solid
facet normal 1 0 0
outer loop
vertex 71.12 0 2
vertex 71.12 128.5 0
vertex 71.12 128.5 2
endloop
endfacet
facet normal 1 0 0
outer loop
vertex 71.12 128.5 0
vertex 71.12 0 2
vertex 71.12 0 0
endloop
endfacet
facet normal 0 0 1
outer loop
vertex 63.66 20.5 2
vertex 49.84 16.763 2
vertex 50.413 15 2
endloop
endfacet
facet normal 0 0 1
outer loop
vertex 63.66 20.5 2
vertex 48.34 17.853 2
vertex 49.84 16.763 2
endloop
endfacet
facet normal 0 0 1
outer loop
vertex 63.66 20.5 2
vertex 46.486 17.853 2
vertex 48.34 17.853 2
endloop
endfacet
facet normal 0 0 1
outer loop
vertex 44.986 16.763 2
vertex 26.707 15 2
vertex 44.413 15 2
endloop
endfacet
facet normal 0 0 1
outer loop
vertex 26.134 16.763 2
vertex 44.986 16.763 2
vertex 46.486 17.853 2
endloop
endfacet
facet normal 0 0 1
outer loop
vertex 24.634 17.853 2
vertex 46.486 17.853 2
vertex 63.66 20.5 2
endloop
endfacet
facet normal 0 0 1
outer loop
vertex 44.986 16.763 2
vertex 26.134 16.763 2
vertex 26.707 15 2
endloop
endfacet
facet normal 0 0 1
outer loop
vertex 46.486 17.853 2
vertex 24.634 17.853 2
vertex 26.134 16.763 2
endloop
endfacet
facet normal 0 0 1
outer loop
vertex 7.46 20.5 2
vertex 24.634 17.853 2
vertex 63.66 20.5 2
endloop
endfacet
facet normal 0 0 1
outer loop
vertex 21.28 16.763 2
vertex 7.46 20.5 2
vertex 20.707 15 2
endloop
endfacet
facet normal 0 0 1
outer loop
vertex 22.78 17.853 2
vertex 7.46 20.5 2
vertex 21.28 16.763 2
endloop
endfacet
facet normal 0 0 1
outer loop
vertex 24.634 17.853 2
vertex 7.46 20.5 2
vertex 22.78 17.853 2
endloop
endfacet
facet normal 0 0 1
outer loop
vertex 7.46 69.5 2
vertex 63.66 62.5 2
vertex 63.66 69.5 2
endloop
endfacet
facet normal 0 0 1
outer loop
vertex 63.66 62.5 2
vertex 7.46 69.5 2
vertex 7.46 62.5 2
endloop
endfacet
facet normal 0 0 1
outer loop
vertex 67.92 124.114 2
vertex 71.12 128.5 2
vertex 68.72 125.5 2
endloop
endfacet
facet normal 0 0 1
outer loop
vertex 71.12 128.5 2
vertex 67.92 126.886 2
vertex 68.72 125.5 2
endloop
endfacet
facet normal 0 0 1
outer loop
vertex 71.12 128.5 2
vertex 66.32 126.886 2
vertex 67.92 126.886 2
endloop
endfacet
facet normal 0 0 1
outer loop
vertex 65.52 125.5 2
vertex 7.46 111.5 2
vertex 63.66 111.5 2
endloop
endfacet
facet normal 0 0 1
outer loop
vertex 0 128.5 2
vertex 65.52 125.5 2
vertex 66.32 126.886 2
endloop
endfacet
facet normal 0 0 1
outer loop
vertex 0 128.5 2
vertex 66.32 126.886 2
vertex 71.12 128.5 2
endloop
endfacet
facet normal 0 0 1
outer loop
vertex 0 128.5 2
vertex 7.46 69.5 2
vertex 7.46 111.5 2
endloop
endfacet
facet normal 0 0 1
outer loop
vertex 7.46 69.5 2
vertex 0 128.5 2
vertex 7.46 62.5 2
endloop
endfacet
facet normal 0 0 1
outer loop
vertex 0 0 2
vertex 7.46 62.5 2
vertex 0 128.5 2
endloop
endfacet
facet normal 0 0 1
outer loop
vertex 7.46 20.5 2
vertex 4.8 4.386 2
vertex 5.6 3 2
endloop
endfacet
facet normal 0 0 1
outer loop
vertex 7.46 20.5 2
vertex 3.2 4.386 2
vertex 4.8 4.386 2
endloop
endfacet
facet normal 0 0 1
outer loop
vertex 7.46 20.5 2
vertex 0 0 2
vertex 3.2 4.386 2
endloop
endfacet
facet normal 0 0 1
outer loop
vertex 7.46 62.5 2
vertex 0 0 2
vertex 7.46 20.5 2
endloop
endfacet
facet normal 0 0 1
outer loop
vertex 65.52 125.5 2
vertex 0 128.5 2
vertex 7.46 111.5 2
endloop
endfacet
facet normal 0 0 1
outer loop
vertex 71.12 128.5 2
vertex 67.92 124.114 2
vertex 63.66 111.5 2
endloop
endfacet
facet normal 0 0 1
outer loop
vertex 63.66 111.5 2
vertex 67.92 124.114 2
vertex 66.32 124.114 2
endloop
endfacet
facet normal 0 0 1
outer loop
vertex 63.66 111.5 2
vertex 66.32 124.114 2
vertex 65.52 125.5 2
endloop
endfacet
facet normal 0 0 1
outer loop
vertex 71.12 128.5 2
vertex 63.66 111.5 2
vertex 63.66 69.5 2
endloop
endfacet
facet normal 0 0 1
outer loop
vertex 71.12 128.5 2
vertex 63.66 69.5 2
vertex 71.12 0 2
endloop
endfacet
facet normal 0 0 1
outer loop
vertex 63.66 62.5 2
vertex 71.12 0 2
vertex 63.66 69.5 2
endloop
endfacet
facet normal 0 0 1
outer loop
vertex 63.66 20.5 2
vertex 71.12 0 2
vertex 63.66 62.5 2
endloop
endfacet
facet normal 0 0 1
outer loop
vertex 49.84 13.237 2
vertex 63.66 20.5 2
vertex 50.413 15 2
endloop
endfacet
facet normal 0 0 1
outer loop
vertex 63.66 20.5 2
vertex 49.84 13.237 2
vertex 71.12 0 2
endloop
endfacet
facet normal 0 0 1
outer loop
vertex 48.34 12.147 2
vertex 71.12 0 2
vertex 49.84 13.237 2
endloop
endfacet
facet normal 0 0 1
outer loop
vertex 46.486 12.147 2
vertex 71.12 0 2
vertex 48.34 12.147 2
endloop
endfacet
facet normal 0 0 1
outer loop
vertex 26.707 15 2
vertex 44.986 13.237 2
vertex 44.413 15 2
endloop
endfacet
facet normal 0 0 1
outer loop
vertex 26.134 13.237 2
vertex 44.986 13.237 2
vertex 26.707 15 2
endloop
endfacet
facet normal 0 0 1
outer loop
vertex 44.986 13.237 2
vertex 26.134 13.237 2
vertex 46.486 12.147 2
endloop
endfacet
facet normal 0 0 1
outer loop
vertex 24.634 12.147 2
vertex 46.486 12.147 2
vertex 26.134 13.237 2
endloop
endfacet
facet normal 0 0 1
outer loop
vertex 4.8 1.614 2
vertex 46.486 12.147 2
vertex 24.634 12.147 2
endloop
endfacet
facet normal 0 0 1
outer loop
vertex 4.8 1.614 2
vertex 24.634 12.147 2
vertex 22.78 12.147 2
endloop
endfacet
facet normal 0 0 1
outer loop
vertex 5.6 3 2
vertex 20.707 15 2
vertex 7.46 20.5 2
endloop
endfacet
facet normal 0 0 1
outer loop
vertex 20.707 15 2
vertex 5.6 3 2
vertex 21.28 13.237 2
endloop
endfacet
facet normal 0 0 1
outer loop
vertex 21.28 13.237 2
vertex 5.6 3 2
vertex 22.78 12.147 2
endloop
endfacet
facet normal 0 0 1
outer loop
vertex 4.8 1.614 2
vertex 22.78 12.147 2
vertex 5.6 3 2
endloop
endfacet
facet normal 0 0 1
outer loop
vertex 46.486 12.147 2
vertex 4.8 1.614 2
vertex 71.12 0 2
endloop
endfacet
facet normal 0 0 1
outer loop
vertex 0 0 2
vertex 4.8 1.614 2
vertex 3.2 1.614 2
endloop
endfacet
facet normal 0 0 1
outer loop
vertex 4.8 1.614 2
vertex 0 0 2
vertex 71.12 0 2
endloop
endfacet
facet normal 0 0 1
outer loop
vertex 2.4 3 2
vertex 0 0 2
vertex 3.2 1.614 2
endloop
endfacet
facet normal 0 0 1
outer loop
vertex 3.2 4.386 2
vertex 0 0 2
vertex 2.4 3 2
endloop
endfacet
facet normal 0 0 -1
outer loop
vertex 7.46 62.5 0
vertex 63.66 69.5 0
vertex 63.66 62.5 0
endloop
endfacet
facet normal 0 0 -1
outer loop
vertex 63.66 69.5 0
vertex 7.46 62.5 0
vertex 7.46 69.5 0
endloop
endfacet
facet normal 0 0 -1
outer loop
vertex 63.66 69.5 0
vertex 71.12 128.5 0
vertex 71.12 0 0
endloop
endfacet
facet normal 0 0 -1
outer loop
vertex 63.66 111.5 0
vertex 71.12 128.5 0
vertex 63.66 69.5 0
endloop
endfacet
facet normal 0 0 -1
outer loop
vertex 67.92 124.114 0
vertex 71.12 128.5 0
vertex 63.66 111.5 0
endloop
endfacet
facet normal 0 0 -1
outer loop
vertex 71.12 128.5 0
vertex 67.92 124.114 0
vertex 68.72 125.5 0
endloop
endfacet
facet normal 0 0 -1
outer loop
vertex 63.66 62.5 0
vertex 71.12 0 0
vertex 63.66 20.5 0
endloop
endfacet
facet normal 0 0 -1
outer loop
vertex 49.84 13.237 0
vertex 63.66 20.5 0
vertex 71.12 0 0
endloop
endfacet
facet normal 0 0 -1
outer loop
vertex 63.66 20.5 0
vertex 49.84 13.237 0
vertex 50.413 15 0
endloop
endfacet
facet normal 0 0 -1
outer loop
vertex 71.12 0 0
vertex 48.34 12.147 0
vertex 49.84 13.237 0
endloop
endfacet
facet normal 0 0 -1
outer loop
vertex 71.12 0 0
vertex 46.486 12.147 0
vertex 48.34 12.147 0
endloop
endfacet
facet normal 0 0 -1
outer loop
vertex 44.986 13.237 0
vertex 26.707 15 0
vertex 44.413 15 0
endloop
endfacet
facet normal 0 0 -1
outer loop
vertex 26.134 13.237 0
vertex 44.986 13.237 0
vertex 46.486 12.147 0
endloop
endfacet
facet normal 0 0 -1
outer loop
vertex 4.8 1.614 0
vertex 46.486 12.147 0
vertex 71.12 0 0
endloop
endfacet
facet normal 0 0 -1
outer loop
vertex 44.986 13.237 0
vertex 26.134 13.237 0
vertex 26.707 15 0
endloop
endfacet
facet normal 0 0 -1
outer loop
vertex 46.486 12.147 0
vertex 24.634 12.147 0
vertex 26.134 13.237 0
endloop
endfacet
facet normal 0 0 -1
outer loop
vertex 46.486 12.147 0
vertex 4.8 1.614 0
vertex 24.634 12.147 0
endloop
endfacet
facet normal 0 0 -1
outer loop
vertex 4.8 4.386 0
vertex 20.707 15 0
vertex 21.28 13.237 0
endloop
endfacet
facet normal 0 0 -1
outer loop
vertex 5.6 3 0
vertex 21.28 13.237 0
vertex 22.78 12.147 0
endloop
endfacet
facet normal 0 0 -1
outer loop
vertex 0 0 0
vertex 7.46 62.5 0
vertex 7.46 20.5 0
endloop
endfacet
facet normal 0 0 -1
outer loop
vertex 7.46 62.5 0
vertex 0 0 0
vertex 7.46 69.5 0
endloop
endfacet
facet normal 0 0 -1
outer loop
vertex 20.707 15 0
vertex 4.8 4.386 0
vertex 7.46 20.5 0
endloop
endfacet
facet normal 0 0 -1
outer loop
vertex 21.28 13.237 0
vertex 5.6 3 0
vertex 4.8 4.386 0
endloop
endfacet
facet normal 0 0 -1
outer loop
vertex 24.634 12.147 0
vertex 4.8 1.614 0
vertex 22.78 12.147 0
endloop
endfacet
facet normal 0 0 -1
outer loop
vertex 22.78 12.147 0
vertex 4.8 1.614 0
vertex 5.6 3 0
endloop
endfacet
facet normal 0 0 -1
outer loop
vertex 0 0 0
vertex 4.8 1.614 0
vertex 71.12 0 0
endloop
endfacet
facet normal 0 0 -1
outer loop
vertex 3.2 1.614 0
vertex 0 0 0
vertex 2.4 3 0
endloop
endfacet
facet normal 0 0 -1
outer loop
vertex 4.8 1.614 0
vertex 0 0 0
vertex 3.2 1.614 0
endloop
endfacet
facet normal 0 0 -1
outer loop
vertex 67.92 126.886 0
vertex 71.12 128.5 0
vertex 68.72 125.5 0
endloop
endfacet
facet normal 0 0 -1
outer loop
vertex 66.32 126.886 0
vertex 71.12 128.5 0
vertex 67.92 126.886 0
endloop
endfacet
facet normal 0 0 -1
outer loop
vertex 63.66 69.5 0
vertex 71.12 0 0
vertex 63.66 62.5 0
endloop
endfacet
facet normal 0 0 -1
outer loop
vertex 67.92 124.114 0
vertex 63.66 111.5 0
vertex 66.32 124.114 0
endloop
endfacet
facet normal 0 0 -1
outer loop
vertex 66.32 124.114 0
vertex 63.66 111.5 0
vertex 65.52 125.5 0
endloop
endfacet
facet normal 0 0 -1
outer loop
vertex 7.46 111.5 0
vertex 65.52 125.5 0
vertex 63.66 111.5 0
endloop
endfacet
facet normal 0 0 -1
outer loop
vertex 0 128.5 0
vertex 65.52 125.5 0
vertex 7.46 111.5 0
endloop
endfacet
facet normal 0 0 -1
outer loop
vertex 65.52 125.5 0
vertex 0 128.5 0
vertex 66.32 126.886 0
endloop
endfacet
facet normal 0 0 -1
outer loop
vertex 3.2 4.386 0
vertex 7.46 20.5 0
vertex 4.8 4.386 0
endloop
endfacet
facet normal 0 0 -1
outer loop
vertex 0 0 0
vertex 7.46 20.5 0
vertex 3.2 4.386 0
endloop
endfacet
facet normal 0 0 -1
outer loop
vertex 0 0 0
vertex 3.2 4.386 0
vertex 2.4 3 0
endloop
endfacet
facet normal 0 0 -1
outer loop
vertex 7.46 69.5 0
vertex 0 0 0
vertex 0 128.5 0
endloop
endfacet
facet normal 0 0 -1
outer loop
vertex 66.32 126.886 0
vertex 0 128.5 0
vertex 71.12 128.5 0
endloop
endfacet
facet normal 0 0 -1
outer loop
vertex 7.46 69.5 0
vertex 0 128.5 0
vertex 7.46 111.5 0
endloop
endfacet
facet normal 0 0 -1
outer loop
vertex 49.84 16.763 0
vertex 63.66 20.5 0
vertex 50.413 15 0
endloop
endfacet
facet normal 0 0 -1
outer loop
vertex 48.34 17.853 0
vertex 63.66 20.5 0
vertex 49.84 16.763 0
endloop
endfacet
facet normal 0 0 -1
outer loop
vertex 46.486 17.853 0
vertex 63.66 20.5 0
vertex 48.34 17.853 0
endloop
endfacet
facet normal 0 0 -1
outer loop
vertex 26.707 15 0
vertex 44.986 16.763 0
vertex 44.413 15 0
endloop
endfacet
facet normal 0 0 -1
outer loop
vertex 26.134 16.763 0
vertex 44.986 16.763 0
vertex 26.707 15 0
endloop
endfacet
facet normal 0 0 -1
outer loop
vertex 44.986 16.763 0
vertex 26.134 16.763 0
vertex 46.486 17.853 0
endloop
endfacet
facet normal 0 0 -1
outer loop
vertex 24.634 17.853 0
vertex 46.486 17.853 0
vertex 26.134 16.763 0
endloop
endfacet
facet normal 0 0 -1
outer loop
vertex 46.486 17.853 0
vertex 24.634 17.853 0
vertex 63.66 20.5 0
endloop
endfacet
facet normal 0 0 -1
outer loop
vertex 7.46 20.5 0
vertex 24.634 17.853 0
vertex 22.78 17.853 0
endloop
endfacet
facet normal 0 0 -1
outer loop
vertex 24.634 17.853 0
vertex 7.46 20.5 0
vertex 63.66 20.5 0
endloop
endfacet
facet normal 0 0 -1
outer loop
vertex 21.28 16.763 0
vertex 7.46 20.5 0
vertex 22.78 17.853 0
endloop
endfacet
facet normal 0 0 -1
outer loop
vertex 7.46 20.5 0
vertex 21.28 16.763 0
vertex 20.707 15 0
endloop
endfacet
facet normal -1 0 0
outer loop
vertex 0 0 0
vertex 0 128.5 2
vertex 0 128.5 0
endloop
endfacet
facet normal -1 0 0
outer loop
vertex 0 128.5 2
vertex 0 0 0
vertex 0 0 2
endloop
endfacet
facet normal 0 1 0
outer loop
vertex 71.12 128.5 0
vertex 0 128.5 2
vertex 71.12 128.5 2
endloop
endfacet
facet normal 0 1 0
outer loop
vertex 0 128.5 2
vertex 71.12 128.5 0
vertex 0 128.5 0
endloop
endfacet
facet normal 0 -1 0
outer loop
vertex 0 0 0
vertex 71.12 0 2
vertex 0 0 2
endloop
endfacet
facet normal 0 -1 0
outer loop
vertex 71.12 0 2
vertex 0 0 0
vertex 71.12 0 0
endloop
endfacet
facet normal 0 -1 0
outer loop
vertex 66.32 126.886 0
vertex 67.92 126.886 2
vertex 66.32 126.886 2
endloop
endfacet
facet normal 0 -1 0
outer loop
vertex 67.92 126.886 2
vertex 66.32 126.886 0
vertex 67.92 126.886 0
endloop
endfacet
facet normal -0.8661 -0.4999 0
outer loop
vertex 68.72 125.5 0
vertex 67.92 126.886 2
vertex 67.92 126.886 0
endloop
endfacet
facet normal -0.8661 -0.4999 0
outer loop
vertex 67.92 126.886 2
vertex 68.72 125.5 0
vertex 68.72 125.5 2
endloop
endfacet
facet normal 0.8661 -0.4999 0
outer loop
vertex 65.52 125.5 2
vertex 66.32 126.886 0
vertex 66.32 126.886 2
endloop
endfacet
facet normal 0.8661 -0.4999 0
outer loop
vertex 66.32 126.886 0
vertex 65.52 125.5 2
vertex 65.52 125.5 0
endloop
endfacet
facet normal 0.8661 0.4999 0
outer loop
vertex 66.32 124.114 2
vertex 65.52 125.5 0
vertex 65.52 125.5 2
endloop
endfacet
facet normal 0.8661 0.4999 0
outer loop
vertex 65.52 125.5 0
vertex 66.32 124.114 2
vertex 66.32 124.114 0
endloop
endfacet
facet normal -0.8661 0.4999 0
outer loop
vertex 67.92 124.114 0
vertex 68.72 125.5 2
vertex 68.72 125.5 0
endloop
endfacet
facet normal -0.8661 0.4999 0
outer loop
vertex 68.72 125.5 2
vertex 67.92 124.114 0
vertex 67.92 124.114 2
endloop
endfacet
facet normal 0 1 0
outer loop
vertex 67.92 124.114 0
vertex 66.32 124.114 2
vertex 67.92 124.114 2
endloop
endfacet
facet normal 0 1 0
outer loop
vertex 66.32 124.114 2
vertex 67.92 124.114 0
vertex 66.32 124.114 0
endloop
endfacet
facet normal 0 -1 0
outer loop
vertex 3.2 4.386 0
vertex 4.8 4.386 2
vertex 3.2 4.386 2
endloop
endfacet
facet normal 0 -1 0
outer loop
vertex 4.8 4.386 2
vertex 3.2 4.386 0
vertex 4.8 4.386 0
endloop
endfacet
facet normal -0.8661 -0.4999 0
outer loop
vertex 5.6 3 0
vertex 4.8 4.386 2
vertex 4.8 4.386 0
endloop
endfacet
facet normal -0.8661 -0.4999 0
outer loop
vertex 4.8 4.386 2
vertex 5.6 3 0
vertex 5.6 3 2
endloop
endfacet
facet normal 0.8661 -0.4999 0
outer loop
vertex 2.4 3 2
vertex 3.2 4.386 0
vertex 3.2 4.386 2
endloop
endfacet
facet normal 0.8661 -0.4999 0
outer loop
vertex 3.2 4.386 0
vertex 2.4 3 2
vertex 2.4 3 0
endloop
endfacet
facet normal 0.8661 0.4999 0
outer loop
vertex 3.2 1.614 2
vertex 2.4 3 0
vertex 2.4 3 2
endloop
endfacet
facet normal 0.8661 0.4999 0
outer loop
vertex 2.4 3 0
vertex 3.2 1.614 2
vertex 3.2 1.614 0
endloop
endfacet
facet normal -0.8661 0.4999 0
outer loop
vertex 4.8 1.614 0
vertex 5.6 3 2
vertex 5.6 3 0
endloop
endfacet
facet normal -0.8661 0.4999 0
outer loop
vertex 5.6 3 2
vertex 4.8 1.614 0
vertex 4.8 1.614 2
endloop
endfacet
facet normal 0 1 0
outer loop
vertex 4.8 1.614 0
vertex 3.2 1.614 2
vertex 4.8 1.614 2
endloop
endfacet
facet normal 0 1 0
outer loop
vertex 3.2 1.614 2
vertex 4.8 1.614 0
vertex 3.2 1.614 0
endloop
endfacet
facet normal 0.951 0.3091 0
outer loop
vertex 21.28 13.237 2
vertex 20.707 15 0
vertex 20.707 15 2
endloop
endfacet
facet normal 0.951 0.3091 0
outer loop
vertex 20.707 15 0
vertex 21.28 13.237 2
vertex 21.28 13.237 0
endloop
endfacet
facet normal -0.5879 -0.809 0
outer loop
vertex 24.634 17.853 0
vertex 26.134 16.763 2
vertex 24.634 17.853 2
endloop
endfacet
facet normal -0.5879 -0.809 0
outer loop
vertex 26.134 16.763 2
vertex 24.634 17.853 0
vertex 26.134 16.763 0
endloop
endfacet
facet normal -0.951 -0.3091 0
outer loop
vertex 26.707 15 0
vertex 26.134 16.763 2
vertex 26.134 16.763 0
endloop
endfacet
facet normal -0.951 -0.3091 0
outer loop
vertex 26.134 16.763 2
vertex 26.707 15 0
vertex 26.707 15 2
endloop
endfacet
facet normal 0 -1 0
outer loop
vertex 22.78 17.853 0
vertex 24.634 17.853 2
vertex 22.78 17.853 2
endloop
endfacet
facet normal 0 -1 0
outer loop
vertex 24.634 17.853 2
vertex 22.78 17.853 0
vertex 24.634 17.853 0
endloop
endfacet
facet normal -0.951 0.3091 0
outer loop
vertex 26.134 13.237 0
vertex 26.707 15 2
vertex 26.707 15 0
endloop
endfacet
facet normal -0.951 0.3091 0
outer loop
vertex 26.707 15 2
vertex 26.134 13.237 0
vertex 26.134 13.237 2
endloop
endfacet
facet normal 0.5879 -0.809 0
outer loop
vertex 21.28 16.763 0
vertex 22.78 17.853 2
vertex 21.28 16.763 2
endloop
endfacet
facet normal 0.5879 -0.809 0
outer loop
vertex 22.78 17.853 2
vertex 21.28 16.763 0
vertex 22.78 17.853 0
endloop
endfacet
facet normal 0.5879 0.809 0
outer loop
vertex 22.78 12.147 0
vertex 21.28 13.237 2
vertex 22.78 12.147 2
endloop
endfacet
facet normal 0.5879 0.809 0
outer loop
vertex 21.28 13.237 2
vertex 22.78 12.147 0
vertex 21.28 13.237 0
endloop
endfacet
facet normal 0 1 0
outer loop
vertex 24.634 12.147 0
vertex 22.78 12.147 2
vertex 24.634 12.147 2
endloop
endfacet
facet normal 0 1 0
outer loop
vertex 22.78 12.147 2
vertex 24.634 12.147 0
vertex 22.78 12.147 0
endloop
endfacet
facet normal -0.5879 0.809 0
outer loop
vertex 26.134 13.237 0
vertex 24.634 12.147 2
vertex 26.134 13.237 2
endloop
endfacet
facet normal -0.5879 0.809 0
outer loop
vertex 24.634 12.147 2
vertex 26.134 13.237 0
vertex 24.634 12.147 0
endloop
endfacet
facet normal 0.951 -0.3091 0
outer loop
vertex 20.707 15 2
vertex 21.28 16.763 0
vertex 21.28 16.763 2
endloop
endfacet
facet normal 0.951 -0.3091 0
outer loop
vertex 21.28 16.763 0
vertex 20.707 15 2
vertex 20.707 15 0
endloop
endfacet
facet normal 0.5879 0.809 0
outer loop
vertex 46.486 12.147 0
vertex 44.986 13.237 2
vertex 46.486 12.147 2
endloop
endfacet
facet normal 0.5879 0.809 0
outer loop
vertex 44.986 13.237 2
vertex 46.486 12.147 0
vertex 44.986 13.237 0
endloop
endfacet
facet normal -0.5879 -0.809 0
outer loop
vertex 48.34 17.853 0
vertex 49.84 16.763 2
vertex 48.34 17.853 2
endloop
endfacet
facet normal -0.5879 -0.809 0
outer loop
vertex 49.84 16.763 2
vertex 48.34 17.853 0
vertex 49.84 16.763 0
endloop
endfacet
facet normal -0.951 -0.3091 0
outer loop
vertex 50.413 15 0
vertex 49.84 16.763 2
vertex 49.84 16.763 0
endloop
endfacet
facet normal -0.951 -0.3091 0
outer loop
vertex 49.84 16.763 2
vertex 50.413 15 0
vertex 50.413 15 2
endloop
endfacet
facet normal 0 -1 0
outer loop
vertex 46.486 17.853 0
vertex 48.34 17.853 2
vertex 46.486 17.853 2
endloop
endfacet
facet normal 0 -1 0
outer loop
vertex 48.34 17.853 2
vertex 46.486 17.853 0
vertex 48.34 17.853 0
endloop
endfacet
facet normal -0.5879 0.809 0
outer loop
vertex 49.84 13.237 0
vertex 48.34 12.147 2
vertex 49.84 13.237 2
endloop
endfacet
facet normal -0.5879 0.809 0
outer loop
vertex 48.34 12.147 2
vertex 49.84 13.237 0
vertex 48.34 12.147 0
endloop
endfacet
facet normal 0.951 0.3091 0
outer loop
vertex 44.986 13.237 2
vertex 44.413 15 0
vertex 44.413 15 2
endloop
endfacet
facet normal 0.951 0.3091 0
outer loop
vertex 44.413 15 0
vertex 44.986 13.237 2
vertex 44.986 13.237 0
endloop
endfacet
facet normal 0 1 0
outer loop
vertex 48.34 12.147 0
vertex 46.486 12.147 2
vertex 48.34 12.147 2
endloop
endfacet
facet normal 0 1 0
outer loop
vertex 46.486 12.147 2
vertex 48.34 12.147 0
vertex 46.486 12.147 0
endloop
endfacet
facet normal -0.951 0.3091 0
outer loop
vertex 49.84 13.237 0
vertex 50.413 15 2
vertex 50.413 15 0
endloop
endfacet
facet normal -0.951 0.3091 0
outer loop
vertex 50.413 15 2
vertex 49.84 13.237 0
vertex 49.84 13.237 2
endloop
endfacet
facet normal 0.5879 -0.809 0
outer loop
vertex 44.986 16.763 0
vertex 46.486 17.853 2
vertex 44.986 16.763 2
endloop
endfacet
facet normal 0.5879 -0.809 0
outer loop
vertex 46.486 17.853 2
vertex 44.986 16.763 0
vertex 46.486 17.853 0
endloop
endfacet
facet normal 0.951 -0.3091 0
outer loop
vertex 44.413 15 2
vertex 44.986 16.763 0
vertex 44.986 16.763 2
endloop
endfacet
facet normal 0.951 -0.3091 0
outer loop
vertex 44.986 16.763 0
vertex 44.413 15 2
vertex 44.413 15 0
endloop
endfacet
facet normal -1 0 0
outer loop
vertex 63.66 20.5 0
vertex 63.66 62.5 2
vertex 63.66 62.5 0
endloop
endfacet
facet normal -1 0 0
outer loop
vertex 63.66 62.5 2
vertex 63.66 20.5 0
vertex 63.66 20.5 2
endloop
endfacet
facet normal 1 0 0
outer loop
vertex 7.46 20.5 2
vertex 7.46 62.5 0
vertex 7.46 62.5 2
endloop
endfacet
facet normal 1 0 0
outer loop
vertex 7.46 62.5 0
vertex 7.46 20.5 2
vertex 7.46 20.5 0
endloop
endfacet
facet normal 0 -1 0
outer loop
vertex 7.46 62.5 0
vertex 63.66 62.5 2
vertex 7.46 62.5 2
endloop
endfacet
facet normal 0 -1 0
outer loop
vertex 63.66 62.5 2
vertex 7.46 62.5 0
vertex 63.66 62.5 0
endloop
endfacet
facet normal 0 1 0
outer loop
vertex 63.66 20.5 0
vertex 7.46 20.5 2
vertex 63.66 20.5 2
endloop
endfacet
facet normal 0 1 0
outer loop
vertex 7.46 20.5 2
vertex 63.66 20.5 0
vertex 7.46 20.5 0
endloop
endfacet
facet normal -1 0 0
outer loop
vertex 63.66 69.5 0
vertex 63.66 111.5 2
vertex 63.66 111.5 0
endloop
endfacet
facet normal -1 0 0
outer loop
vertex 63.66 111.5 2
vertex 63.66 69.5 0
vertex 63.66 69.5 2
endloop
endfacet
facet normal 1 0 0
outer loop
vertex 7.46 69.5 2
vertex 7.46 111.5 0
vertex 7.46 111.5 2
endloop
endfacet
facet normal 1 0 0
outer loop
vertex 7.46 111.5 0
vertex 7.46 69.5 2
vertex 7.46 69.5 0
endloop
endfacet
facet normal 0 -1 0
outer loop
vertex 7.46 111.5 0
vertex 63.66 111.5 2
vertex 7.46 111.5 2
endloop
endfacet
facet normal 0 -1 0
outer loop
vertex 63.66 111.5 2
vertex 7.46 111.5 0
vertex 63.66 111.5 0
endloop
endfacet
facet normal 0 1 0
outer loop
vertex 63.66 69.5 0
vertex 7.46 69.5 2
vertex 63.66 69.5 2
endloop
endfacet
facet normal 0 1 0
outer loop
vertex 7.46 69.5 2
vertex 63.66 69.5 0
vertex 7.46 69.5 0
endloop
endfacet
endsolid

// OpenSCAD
// Dimensions
panel_width = 14 * 5.08;    // 14HP
panel_height = 128.5;  // 3U
panel_thickness = 2.00;

// Mounting holes
mount_offset_y = 3;
mount_offset_x = 4;
mounting_hole_diameter = 3.2; // M3

// Compoonent hole sizes
jack_hole_diameter = 6; // 3.5mm

jack_height = 10;
lcd_height = 48.5;
lcd_width = 66.1;
screen_height = 42;
screen_width = 56.2;

module mounting_hole(x_pos, y_pos) {
    translate([x_pos, y_pos, panel_thickness / 2])
        cylinder(d = mounting_hole_diameter, h = panel_thickness + 1, center = true);
}

module jack(x_pos, y_pos) {
    translate([x_pos, y_pos, panel_thickness / 2])
        cylinder(d = jack_hole_diameter, h = panel_thickness + 1, center = true);
}

module lcd(x_pos, y_pos) {
    translate([x_pos, y_pos, -1])
        cube([screen_width, screen_height, panel_thickness + 2]);
}


buffer = 0.5;

jack2lcd_y = jack_height / 2 + buffer;
lcd2lcd_y = lcd_height + buffer;

jacks_y = 15;
lcd1_y = jacks_y + jack2lcd_y;
lcd2_y = lcd1_y + lcd2lcd_y;

module panel() {
    difference() {
        // Base panel
        cube([panel_width, panel_height, panel_thickness]);

        // Mounting holes
        mounting_hole(panel_width - mount_offset_x, panel_height - mount_offset_y);
        mounting_hole(mount_offset_x, mount_offset_y);

        // Components (Jacks, Toggles, Pot)
        jack(panel_width / 3, jacks_y);
        jack(panel_width - (panel_width / 3), jacks_y);
        lcd((panel_width - screen_width)/2, lcd1_y);
        lcd((panel_width - screen_width)/2, lcd2_y);
    }
}

panel();
